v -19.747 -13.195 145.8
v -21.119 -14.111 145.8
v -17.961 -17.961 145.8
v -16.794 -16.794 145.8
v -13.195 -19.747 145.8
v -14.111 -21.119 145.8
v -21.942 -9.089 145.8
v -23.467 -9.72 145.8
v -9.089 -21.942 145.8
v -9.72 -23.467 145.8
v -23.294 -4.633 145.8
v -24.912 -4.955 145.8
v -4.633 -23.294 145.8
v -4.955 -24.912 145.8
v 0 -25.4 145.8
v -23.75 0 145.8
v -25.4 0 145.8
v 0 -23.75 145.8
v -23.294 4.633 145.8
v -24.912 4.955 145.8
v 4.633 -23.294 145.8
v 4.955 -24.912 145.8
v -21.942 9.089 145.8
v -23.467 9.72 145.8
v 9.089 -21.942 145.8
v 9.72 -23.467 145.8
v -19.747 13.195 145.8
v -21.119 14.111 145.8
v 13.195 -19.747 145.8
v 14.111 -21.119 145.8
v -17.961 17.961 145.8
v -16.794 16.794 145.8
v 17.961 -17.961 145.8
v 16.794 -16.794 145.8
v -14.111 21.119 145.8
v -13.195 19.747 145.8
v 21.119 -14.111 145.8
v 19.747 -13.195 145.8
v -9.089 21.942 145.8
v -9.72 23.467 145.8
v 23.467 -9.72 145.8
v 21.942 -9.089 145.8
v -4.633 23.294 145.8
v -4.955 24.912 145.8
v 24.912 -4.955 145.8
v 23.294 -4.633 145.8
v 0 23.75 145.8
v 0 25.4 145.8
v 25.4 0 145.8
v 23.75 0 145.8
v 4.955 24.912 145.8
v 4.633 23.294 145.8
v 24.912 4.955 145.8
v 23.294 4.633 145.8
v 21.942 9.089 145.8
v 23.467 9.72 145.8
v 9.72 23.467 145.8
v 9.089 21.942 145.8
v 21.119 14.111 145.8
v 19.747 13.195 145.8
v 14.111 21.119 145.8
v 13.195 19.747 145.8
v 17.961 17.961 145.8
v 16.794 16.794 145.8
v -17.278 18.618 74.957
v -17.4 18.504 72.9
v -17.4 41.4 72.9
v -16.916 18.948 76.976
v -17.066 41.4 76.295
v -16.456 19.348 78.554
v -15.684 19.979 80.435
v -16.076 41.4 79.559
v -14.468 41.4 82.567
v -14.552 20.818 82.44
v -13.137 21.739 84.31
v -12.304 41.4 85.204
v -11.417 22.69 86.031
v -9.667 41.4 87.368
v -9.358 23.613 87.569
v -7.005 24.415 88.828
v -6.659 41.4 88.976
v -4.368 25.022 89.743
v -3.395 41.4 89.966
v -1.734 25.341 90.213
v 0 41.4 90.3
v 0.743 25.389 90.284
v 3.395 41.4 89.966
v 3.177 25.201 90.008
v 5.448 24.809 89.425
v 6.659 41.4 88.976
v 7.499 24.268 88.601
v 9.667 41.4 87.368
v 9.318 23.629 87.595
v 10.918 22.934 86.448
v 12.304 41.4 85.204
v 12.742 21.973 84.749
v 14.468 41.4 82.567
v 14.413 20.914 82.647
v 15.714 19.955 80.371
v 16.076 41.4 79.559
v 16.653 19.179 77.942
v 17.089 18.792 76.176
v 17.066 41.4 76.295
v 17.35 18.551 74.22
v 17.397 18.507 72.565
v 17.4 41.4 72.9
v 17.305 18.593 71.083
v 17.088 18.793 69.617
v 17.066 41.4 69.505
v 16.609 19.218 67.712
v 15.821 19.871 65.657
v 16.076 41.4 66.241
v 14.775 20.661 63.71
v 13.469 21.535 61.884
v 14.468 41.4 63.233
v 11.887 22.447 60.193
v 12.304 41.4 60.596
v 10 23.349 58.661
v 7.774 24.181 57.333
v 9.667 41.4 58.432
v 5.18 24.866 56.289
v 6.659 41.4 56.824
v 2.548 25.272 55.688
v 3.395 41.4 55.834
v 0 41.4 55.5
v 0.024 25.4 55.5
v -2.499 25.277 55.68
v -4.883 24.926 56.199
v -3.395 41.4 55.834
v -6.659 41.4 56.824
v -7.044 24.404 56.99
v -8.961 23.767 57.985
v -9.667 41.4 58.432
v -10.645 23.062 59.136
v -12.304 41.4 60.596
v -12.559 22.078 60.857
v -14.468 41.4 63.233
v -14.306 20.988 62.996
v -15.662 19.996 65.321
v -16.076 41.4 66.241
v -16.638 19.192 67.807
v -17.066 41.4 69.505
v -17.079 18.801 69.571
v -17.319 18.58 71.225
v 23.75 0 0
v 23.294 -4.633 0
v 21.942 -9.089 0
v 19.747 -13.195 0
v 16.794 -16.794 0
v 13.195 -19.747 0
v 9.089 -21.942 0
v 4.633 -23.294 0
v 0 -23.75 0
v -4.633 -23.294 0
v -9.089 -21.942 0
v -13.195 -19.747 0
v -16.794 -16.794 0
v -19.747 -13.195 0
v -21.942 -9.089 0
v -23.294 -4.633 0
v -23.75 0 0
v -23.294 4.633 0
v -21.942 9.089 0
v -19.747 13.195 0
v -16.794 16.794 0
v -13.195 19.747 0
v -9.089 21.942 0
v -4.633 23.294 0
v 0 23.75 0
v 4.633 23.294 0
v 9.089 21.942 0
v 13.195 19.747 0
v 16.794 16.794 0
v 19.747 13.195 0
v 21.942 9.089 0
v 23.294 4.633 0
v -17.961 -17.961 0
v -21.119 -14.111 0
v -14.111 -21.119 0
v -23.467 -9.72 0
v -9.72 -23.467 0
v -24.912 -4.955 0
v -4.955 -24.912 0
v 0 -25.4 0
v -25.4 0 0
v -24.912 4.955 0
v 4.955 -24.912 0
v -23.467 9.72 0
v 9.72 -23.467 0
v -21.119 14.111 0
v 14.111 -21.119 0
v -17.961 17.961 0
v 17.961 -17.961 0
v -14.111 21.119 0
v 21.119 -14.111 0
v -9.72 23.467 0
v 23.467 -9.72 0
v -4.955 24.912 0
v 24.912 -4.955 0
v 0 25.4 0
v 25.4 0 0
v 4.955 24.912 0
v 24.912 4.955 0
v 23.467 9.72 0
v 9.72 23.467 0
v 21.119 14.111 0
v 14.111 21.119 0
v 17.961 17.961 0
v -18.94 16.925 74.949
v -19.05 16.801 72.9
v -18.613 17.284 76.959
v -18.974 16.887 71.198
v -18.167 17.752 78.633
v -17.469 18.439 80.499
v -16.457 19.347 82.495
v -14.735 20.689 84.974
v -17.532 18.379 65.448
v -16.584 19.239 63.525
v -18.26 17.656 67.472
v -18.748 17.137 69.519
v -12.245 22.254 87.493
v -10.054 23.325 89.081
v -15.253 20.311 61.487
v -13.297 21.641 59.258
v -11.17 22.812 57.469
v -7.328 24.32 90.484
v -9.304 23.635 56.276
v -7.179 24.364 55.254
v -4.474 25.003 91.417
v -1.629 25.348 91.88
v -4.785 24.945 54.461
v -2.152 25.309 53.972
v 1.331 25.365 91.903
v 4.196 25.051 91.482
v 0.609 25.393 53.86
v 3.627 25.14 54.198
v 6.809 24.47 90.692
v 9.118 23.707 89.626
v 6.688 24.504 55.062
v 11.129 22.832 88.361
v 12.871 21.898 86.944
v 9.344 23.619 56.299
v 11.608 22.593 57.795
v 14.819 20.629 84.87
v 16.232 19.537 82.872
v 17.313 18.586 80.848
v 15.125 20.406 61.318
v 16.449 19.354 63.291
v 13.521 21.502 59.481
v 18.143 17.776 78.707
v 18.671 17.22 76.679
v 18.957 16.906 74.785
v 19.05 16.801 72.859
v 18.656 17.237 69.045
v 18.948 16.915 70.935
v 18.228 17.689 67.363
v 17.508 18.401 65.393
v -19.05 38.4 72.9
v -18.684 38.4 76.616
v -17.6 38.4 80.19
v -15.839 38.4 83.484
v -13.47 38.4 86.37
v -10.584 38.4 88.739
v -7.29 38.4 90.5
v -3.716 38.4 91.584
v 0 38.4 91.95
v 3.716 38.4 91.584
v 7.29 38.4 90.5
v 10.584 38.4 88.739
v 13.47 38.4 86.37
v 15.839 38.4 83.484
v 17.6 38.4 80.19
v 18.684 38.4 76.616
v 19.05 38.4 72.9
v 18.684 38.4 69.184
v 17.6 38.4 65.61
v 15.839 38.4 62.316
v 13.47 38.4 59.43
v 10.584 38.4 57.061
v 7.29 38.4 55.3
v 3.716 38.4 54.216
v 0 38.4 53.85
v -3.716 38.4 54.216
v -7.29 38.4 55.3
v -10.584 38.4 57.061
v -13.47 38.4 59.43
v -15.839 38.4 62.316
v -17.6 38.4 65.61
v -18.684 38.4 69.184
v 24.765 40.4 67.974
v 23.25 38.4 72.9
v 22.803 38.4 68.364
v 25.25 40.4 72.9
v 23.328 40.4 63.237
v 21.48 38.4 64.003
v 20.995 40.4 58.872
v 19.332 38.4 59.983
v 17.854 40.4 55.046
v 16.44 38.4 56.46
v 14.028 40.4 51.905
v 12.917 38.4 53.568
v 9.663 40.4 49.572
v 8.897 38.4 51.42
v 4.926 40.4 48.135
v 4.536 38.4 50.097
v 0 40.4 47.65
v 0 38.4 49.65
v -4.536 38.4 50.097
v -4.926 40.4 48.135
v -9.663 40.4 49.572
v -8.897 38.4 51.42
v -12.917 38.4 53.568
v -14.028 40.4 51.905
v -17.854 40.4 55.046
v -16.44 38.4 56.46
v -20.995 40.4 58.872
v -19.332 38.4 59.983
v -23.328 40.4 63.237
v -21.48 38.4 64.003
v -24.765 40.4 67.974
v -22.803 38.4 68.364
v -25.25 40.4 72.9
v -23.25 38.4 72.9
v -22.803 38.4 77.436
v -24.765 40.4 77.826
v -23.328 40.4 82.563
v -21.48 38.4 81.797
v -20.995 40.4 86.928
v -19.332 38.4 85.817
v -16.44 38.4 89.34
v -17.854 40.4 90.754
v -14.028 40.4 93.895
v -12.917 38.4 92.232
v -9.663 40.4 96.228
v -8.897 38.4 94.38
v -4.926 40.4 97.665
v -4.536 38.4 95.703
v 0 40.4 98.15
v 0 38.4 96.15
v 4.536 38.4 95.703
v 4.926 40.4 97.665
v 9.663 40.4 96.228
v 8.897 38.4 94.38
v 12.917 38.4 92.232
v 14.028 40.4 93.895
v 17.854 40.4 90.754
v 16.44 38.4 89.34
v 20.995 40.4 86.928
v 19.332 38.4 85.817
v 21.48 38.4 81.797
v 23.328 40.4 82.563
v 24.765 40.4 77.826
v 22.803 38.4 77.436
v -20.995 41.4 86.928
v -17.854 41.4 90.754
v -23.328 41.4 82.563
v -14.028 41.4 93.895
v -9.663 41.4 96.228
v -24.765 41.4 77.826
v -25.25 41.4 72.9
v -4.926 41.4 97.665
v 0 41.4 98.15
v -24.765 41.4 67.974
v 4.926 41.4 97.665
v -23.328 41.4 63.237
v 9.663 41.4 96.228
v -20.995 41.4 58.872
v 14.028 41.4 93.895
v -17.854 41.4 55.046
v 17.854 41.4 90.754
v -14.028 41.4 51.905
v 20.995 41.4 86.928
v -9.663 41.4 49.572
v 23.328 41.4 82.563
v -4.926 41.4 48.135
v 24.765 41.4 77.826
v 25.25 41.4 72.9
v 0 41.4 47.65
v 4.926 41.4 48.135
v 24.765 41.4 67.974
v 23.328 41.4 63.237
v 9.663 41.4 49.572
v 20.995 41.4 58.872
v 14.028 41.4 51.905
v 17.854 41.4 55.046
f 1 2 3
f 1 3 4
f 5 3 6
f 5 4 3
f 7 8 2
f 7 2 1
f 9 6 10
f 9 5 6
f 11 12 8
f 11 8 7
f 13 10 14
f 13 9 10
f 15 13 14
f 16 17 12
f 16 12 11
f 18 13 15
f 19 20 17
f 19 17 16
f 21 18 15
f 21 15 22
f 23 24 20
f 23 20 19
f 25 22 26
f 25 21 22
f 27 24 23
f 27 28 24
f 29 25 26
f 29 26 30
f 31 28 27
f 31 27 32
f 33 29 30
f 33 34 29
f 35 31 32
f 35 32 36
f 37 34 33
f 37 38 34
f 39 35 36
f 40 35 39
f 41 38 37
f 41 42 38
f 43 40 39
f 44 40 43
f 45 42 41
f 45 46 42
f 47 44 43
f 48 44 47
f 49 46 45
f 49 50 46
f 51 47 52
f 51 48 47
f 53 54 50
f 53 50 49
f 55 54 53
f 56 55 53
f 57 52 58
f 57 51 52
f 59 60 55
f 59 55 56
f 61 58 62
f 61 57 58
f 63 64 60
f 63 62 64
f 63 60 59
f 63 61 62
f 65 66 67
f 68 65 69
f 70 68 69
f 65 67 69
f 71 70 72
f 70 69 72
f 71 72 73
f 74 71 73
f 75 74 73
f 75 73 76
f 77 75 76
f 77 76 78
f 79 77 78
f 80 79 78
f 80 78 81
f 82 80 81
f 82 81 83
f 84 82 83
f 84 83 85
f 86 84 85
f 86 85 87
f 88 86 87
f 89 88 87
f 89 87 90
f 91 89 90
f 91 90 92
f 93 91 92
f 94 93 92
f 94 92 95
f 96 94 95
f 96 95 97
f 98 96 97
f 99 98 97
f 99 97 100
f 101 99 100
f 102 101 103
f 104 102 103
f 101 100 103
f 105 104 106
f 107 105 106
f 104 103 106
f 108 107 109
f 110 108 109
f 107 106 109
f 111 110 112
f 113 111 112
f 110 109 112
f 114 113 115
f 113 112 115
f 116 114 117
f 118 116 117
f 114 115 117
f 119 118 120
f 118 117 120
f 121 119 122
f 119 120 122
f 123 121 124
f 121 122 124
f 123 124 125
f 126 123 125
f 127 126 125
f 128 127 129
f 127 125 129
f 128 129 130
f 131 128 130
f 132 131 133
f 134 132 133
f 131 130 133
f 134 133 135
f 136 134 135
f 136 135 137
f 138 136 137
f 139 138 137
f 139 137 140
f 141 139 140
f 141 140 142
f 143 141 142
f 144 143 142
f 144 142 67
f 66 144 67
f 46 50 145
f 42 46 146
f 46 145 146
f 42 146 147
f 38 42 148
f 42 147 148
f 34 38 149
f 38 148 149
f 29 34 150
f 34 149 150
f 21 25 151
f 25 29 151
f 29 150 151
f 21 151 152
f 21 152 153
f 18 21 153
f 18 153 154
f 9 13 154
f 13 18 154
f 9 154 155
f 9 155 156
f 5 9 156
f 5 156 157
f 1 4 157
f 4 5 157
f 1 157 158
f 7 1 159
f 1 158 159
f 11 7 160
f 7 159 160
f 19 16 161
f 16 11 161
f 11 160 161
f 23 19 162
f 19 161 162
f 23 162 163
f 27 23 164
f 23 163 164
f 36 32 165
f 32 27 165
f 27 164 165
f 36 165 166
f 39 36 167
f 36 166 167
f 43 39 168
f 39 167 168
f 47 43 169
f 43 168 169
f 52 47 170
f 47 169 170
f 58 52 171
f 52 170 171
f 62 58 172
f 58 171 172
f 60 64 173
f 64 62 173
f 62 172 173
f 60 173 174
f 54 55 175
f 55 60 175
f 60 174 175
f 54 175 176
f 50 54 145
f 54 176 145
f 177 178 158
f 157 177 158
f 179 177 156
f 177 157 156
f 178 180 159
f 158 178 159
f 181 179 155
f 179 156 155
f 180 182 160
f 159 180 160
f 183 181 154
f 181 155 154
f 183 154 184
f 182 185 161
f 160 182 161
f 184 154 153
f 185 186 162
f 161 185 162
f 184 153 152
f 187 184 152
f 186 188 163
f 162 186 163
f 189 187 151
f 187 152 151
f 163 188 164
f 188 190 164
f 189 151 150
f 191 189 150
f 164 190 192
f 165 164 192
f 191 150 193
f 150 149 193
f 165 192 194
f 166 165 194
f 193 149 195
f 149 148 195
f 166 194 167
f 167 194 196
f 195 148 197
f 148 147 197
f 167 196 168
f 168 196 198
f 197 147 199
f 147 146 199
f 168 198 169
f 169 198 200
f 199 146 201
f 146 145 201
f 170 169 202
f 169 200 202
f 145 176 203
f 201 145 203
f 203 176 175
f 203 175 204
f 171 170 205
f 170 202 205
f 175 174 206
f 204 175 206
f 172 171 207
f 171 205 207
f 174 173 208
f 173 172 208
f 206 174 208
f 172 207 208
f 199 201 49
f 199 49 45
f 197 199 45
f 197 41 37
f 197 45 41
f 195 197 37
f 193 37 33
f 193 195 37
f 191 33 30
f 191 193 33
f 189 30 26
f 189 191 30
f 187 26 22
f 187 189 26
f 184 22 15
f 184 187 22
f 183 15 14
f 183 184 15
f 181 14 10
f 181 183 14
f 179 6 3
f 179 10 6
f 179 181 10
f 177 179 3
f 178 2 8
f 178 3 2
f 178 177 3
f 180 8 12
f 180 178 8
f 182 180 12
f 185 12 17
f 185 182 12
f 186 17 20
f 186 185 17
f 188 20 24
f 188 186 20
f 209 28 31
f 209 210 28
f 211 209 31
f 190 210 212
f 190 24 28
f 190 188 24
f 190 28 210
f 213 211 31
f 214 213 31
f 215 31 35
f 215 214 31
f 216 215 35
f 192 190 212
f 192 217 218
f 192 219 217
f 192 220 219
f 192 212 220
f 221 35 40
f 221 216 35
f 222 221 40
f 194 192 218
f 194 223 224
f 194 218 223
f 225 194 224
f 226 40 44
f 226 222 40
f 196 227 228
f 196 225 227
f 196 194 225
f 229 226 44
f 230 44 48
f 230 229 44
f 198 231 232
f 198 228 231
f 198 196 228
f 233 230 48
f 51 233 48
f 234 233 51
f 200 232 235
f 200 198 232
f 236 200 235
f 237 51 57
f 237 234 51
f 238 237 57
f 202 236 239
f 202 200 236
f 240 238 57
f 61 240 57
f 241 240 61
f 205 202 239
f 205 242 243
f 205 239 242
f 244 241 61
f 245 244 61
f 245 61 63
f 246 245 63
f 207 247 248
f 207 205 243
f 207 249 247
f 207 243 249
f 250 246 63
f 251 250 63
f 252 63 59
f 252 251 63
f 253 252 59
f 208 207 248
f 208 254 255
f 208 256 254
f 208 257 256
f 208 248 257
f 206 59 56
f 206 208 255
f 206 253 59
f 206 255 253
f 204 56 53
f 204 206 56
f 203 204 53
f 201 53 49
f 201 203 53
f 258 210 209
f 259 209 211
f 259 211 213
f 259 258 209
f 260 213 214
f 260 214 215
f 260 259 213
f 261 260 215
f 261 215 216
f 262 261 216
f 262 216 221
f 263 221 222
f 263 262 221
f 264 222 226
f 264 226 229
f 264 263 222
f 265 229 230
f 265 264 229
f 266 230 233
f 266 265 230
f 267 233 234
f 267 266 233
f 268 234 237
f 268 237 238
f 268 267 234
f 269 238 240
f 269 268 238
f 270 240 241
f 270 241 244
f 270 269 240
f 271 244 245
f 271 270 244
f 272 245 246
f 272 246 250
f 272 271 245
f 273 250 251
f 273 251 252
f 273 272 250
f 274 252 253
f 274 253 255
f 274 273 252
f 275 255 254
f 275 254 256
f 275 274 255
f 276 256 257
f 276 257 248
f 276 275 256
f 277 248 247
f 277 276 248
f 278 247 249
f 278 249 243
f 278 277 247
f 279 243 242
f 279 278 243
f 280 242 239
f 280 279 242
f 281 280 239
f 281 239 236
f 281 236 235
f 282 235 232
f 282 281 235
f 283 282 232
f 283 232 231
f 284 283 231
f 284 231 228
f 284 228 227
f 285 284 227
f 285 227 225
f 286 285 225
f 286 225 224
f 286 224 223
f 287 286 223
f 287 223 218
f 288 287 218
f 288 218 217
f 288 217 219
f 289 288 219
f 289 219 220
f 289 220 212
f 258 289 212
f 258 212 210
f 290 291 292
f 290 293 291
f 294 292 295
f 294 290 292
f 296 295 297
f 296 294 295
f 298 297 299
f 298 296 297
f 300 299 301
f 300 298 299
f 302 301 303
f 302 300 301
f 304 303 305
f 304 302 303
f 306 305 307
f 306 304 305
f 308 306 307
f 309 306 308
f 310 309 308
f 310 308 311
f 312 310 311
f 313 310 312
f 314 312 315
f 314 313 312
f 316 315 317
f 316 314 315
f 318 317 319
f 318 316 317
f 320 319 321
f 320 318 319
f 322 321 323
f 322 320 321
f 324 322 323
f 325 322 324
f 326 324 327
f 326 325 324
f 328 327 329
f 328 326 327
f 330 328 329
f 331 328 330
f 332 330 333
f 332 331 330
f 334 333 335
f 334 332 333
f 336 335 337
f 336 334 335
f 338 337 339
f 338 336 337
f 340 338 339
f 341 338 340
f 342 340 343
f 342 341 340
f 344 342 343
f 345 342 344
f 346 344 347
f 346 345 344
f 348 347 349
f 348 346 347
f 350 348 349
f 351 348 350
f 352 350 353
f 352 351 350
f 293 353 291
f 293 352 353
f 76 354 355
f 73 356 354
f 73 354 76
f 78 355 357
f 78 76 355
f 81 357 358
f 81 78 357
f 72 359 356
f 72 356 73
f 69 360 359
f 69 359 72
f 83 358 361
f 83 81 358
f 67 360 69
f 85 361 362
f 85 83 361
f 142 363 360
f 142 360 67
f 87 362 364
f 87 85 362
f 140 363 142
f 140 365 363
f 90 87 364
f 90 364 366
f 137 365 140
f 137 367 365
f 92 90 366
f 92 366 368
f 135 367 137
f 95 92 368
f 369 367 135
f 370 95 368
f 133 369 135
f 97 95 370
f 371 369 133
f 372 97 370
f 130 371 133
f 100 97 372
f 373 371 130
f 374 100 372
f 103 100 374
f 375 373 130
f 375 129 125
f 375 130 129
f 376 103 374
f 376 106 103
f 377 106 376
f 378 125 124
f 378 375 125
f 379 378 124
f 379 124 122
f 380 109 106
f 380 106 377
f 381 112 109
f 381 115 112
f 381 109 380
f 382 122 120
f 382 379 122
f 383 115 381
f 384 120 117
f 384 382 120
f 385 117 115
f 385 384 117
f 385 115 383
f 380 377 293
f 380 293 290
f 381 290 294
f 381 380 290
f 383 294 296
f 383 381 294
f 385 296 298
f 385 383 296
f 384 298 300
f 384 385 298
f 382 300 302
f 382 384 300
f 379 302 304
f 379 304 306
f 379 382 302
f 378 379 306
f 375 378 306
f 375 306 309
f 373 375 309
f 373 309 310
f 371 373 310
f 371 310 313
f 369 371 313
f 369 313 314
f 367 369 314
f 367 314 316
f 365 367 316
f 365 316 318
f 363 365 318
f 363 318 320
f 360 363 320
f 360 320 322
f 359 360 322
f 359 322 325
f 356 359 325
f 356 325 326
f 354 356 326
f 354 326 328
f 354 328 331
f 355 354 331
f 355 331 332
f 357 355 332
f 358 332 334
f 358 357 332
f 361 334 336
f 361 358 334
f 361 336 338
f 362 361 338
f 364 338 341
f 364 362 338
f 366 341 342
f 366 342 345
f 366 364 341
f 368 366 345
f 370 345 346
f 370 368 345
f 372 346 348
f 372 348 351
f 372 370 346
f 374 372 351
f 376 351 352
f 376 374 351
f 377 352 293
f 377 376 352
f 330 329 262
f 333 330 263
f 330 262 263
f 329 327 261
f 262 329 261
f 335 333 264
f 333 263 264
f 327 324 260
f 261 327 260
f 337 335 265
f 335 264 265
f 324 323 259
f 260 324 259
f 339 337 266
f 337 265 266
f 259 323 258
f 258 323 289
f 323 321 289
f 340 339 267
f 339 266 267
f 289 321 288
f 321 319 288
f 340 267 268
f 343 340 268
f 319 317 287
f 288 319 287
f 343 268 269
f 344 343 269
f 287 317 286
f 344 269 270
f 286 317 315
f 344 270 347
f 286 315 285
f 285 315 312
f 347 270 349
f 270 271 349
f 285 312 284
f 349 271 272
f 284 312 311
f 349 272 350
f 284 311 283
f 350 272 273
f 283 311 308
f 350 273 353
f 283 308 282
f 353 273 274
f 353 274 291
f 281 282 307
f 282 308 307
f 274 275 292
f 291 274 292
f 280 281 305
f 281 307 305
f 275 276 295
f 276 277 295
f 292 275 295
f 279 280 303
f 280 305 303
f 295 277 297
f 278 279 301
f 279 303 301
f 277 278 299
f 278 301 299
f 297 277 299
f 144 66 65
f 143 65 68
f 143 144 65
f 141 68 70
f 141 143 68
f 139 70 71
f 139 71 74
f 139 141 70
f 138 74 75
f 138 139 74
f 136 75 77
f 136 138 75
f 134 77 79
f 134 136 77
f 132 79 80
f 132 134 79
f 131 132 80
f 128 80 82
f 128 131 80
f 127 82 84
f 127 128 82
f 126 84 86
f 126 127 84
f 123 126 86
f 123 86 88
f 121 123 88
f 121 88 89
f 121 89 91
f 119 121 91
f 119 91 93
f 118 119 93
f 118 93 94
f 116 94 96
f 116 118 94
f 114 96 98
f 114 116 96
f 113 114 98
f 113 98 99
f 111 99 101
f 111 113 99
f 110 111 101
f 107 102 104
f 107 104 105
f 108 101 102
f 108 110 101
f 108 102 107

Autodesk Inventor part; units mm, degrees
ref_plane "YZ Plane" through (0, 0, 0) normal (1, 0, 0) x (0, 1, 0)
ref_plane "XZ Plane" through (0, 0, 0) normal (0, 1, 0) x (-1, 0, 0)
sketch "Sketch1" plane through (0, 0, 0) normal (0, 0, 1) x (1, 0, 0)
  circle A0 centre (0, 0) radius 25.4
  circle A1 centre (0, 0) radius 23.75
  dimension "d0" = 50.8
  dimension "d1" = 1.65
extrude "Extrusion1" add sketch "Sketch1" along normal blind 145.8
ref_plane "Work Plane1" through (0, 41.4, 0) normal (0, 1, 0) x (-1, 0, 0)
sketch "Sketch2" plane through (0, 41.4, 0) normal (0, 1, 0) x (-1, 0, 0)
  line L0 (-25.4, 145.8) -> (25.4, 145.8) projected
  line L1 (-25.4, 145.8) -> (25.4, 145.8) projected
  line L2 (-25.4, 0) -> (25.4, 0) projected
  line L3 (25.4, 0) -> (25.4, 145.8) projected
  line L4 (-25.4, 0) -> (-25.4, 145.8) projected
  line L5 (0, 145.8) -> (0, 0) construction
  circle A0 centre (0, 72.9) radius 19.05
  circle A1 centre (0, 72.9) radius 17.4
  dimension "d5" = 38.1
  dimension "d7" = 1.65
extrude "Extrusion2" add sketch "Sketch2" against normal up to next contours A0
sketch "Sketch3" plane through (0, 41.4, 72.9) normal (0, 1, 0) x (1, 0, 0)
  circle A0 centre (0, 0) radius 19.05 projected
  circle A1 centre (0, 0) radius 25.25
  dimension "d10" = 50.5
extrude "Extrusion3" add sketch "Sketch3" against normal blind 3
chamfer "Chamfer1" distance 2 angle 45 1 edges at (-25.25, 38.4, 72.9)
properties part number "ASME BPE Red Inst Tee-50.8-38.1"
